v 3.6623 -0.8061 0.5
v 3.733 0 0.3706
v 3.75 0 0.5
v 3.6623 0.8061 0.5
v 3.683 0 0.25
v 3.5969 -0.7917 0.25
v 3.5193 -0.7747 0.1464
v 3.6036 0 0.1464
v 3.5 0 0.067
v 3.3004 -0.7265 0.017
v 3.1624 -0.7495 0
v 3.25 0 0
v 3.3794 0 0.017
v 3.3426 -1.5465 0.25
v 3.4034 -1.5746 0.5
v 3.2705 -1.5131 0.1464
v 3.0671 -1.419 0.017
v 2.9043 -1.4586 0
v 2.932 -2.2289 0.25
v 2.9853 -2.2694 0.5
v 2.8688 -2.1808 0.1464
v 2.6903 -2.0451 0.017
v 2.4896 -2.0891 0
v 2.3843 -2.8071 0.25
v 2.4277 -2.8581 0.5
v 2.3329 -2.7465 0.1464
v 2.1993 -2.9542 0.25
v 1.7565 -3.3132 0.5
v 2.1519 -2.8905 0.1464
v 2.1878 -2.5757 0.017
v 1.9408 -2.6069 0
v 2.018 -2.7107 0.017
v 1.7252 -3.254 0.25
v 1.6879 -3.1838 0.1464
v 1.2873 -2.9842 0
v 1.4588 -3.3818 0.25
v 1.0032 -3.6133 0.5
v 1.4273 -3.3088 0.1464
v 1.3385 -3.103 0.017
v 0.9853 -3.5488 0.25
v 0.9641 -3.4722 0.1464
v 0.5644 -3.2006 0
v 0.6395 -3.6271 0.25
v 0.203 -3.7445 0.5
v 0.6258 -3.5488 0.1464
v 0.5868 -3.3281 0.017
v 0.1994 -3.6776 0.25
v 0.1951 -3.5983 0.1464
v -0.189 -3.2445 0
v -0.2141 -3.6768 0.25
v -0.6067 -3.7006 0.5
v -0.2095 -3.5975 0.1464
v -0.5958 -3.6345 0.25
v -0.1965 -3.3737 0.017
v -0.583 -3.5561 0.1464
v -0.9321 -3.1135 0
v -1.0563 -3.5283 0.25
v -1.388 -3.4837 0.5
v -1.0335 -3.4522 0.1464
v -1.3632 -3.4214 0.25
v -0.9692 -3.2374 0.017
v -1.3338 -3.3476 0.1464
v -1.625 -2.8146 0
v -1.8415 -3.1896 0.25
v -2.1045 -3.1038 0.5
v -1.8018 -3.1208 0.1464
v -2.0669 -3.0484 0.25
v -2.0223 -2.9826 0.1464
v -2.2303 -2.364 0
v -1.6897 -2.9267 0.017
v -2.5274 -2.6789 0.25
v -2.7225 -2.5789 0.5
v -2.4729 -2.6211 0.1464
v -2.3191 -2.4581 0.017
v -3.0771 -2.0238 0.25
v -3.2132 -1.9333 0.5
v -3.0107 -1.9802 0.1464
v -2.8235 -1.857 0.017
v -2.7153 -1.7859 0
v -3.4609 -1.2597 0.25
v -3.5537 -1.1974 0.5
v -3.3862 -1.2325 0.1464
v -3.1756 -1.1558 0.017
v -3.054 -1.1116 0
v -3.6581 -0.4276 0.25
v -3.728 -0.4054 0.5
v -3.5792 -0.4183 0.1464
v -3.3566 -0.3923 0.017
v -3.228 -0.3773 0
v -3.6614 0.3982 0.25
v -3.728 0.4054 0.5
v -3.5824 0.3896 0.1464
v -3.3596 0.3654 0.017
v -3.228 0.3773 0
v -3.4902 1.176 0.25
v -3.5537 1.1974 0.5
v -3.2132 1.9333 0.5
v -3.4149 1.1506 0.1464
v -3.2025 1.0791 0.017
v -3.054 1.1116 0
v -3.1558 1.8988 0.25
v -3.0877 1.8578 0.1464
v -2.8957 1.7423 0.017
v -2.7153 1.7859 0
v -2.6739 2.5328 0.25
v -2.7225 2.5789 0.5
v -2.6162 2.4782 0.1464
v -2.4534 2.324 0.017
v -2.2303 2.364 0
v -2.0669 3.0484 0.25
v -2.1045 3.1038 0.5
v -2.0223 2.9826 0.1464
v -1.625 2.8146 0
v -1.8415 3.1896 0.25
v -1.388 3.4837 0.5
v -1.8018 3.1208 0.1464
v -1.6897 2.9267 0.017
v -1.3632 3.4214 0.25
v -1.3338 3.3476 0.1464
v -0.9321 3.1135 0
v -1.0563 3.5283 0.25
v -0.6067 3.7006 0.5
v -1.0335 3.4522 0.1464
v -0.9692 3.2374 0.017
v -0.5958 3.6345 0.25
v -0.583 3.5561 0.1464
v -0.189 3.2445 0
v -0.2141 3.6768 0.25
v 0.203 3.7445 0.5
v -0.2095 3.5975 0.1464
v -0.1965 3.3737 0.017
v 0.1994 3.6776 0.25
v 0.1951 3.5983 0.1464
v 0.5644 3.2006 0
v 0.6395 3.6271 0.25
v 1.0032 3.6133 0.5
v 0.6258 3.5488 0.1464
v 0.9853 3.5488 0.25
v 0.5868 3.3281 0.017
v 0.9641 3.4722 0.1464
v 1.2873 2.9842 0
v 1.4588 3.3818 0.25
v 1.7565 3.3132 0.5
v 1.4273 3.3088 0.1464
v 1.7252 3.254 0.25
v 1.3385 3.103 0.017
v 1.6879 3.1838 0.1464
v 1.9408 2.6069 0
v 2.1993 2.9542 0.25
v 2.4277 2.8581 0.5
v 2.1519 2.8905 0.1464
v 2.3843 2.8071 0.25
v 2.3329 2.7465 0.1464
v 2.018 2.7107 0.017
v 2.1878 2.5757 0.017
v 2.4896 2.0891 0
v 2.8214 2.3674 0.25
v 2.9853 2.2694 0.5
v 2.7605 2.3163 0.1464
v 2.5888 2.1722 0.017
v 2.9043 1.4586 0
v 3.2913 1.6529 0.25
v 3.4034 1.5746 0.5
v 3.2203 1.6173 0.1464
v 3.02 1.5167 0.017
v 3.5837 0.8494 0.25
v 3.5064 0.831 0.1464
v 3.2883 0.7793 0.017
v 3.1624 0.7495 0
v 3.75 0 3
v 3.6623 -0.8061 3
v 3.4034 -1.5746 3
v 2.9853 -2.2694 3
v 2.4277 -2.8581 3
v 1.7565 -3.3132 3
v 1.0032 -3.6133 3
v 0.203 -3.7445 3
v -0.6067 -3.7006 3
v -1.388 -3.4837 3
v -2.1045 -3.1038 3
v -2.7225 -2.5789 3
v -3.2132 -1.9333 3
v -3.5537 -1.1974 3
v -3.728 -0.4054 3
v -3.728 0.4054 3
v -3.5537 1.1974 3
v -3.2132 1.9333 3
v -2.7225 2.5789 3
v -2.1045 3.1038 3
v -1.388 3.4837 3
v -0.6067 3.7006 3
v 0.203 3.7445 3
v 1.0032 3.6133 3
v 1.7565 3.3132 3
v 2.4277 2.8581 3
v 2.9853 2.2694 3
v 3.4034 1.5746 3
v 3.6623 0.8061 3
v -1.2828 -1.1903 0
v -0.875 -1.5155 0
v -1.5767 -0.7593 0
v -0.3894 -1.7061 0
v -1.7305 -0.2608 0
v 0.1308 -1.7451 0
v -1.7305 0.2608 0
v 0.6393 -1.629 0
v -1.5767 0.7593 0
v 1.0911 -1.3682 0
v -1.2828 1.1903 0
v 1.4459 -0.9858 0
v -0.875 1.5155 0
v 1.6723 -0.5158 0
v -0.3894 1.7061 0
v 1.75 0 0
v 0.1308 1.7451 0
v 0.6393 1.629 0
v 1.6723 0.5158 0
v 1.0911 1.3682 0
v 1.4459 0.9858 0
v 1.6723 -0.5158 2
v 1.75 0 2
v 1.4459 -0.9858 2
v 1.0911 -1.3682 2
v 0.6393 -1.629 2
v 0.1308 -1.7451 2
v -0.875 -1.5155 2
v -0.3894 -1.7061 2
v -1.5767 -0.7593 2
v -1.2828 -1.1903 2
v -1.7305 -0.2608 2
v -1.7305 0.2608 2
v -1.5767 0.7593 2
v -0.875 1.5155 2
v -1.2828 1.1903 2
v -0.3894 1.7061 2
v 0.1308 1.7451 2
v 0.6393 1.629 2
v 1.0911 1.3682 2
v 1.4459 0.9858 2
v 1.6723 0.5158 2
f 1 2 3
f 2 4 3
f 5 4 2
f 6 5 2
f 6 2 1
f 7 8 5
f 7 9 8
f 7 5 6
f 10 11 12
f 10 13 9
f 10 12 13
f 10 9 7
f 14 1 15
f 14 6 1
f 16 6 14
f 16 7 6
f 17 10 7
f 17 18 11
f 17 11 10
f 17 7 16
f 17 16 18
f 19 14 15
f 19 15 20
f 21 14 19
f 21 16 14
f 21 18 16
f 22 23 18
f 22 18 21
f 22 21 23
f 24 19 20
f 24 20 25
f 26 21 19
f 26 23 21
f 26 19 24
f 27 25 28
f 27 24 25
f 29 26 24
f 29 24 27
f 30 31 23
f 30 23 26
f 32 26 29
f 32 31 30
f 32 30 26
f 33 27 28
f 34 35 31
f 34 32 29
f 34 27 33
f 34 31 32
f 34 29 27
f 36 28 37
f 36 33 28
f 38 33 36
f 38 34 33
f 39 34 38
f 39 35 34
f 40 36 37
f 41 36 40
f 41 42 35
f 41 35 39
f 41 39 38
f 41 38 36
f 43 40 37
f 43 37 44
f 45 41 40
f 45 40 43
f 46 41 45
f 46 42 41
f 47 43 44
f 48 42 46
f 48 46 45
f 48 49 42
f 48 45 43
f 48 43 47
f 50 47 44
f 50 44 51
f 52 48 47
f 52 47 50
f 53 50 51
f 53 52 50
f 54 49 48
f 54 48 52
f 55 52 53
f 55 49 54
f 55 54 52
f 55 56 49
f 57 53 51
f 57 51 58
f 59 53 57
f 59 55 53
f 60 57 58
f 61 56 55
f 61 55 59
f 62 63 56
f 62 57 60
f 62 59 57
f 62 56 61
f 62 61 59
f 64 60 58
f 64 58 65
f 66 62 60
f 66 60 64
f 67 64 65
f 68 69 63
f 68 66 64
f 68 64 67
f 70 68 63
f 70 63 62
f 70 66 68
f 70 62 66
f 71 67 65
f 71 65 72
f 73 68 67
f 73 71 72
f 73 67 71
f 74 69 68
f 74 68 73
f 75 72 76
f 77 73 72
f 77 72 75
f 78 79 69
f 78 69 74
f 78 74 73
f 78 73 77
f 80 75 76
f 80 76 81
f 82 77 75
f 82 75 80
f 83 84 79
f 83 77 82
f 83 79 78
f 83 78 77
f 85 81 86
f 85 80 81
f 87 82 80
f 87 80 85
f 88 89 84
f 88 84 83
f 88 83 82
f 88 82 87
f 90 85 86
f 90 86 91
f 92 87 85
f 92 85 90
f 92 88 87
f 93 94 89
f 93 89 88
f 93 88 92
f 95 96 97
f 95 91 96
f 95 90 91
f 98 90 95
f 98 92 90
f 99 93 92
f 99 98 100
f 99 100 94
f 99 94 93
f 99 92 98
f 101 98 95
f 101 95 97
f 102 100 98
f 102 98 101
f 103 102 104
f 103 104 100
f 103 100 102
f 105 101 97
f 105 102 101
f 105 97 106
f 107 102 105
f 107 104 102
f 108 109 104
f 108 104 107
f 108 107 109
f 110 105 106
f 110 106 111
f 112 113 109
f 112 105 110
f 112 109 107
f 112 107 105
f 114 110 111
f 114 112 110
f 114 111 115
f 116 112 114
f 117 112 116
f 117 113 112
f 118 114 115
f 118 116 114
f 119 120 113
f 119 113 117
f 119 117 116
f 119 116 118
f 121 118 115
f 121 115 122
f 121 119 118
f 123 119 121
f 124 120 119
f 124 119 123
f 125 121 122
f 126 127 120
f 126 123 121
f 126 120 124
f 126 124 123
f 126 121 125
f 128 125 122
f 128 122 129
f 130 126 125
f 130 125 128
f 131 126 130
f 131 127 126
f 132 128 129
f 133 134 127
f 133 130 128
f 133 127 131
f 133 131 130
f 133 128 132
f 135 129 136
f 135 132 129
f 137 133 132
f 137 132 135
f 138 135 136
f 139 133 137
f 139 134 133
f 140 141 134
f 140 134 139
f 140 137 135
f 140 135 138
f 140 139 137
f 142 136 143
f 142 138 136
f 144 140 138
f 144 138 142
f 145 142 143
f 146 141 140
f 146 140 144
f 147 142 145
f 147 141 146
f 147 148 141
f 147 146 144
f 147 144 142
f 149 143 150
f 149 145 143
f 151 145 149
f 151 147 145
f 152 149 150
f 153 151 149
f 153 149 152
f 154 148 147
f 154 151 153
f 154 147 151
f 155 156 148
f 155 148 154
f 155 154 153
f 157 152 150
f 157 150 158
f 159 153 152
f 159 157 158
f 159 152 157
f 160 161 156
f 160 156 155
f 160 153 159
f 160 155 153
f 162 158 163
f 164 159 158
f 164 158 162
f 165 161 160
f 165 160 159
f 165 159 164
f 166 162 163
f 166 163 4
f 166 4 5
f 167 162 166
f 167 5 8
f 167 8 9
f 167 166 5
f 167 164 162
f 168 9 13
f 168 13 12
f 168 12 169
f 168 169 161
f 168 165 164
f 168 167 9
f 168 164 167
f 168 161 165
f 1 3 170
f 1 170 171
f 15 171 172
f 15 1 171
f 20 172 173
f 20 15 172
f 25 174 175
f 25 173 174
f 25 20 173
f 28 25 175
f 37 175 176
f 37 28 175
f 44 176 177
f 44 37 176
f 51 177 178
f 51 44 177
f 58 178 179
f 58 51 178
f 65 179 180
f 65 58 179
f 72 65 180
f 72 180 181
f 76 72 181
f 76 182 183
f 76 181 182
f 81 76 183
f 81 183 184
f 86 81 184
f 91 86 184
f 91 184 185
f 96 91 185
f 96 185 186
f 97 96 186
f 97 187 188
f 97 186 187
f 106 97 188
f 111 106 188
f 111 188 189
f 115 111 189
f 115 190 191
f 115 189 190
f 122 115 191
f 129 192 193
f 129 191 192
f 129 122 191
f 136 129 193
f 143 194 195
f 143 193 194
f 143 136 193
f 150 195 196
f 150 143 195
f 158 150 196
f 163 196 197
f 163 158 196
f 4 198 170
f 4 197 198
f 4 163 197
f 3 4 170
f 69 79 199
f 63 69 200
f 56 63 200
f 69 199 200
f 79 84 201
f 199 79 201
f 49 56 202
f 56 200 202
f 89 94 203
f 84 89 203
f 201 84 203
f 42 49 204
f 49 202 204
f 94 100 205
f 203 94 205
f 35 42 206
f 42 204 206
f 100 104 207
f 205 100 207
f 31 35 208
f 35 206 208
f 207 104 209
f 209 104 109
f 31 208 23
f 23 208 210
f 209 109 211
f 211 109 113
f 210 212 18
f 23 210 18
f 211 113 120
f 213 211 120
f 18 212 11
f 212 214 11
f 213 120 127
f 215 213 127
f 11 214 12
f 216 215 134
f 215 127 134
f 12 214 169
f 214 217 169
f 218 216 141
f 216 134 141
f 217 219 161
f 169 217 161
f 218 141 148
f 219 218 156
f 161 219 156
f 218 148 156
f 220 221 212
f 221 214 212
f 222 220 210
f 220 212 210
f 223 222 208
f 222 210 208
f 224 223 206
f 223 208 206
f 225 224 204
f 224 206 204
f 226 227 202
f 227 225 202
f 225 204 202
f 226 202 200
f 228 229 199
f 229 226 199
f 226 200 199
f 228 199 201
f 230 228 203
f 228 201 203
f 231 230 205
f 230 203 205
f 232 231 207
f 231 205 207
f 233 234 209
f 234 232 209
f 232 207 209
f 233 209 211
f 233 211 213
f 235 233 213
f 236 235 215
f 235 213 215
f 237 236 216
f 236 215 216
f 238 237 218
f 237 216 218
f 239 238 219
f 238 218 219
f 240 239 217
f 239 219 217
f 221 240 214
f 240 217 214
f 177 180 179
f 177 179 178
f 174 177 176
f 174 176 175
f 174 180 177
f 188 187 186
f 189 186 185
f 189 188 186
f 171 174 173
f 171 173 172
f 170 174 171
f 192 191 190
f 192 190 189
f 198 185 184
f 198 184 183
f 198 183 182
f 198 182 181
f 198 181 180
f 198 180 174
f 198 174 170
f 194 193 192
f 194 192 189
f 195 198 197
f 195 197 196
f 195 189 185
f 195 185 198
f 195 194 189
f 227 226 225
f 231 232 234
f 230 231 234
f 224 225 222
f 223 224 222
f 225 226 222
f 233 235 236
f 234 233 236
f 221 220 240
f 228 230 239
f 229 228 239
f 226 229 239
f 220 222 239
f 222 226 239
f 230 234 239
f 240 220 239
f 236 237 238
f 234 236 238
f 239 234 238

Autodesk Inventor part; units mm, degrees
ref_plane "YZ Plane" through (0, 0, 0) normal (1, 0, 0) x (0, 1, 0)
ref_plane "XZ Plane" through (0, 0, 0) normal (0, 1, 0) x (-1, 0, 0)
ref_plane "XY Plane" through (0, 0, 0) normal (0, 0, 1) x (1, 0, 0)
sketch "Sketch1" plane through (0, 0, 0) normal (0, 0, 1) x (1, 0, 0)
  circle A0 centre (0, 0) radius 1.75
  circle A1 centre (0, 0) radius 3.75
  dimension "d0" = 3.5
  dimension "d1" = 2
extrude "Extrusion1" add sketch "Sketch1" along normal blind 2
fillet "Fillet1" radius 0.5 1 edges at (-3.75, 0, 0)
sketch "Sketch2" plane through (0, 0, 2) normal (0, 0, 1) x (1, 0, 0)
  circle A0 centre (0, 0) radius 3.75
extrude "Extrusion2" add sketch "Sketch2" along normal blind 1
properties part number "direksiyon mili tutucu"
